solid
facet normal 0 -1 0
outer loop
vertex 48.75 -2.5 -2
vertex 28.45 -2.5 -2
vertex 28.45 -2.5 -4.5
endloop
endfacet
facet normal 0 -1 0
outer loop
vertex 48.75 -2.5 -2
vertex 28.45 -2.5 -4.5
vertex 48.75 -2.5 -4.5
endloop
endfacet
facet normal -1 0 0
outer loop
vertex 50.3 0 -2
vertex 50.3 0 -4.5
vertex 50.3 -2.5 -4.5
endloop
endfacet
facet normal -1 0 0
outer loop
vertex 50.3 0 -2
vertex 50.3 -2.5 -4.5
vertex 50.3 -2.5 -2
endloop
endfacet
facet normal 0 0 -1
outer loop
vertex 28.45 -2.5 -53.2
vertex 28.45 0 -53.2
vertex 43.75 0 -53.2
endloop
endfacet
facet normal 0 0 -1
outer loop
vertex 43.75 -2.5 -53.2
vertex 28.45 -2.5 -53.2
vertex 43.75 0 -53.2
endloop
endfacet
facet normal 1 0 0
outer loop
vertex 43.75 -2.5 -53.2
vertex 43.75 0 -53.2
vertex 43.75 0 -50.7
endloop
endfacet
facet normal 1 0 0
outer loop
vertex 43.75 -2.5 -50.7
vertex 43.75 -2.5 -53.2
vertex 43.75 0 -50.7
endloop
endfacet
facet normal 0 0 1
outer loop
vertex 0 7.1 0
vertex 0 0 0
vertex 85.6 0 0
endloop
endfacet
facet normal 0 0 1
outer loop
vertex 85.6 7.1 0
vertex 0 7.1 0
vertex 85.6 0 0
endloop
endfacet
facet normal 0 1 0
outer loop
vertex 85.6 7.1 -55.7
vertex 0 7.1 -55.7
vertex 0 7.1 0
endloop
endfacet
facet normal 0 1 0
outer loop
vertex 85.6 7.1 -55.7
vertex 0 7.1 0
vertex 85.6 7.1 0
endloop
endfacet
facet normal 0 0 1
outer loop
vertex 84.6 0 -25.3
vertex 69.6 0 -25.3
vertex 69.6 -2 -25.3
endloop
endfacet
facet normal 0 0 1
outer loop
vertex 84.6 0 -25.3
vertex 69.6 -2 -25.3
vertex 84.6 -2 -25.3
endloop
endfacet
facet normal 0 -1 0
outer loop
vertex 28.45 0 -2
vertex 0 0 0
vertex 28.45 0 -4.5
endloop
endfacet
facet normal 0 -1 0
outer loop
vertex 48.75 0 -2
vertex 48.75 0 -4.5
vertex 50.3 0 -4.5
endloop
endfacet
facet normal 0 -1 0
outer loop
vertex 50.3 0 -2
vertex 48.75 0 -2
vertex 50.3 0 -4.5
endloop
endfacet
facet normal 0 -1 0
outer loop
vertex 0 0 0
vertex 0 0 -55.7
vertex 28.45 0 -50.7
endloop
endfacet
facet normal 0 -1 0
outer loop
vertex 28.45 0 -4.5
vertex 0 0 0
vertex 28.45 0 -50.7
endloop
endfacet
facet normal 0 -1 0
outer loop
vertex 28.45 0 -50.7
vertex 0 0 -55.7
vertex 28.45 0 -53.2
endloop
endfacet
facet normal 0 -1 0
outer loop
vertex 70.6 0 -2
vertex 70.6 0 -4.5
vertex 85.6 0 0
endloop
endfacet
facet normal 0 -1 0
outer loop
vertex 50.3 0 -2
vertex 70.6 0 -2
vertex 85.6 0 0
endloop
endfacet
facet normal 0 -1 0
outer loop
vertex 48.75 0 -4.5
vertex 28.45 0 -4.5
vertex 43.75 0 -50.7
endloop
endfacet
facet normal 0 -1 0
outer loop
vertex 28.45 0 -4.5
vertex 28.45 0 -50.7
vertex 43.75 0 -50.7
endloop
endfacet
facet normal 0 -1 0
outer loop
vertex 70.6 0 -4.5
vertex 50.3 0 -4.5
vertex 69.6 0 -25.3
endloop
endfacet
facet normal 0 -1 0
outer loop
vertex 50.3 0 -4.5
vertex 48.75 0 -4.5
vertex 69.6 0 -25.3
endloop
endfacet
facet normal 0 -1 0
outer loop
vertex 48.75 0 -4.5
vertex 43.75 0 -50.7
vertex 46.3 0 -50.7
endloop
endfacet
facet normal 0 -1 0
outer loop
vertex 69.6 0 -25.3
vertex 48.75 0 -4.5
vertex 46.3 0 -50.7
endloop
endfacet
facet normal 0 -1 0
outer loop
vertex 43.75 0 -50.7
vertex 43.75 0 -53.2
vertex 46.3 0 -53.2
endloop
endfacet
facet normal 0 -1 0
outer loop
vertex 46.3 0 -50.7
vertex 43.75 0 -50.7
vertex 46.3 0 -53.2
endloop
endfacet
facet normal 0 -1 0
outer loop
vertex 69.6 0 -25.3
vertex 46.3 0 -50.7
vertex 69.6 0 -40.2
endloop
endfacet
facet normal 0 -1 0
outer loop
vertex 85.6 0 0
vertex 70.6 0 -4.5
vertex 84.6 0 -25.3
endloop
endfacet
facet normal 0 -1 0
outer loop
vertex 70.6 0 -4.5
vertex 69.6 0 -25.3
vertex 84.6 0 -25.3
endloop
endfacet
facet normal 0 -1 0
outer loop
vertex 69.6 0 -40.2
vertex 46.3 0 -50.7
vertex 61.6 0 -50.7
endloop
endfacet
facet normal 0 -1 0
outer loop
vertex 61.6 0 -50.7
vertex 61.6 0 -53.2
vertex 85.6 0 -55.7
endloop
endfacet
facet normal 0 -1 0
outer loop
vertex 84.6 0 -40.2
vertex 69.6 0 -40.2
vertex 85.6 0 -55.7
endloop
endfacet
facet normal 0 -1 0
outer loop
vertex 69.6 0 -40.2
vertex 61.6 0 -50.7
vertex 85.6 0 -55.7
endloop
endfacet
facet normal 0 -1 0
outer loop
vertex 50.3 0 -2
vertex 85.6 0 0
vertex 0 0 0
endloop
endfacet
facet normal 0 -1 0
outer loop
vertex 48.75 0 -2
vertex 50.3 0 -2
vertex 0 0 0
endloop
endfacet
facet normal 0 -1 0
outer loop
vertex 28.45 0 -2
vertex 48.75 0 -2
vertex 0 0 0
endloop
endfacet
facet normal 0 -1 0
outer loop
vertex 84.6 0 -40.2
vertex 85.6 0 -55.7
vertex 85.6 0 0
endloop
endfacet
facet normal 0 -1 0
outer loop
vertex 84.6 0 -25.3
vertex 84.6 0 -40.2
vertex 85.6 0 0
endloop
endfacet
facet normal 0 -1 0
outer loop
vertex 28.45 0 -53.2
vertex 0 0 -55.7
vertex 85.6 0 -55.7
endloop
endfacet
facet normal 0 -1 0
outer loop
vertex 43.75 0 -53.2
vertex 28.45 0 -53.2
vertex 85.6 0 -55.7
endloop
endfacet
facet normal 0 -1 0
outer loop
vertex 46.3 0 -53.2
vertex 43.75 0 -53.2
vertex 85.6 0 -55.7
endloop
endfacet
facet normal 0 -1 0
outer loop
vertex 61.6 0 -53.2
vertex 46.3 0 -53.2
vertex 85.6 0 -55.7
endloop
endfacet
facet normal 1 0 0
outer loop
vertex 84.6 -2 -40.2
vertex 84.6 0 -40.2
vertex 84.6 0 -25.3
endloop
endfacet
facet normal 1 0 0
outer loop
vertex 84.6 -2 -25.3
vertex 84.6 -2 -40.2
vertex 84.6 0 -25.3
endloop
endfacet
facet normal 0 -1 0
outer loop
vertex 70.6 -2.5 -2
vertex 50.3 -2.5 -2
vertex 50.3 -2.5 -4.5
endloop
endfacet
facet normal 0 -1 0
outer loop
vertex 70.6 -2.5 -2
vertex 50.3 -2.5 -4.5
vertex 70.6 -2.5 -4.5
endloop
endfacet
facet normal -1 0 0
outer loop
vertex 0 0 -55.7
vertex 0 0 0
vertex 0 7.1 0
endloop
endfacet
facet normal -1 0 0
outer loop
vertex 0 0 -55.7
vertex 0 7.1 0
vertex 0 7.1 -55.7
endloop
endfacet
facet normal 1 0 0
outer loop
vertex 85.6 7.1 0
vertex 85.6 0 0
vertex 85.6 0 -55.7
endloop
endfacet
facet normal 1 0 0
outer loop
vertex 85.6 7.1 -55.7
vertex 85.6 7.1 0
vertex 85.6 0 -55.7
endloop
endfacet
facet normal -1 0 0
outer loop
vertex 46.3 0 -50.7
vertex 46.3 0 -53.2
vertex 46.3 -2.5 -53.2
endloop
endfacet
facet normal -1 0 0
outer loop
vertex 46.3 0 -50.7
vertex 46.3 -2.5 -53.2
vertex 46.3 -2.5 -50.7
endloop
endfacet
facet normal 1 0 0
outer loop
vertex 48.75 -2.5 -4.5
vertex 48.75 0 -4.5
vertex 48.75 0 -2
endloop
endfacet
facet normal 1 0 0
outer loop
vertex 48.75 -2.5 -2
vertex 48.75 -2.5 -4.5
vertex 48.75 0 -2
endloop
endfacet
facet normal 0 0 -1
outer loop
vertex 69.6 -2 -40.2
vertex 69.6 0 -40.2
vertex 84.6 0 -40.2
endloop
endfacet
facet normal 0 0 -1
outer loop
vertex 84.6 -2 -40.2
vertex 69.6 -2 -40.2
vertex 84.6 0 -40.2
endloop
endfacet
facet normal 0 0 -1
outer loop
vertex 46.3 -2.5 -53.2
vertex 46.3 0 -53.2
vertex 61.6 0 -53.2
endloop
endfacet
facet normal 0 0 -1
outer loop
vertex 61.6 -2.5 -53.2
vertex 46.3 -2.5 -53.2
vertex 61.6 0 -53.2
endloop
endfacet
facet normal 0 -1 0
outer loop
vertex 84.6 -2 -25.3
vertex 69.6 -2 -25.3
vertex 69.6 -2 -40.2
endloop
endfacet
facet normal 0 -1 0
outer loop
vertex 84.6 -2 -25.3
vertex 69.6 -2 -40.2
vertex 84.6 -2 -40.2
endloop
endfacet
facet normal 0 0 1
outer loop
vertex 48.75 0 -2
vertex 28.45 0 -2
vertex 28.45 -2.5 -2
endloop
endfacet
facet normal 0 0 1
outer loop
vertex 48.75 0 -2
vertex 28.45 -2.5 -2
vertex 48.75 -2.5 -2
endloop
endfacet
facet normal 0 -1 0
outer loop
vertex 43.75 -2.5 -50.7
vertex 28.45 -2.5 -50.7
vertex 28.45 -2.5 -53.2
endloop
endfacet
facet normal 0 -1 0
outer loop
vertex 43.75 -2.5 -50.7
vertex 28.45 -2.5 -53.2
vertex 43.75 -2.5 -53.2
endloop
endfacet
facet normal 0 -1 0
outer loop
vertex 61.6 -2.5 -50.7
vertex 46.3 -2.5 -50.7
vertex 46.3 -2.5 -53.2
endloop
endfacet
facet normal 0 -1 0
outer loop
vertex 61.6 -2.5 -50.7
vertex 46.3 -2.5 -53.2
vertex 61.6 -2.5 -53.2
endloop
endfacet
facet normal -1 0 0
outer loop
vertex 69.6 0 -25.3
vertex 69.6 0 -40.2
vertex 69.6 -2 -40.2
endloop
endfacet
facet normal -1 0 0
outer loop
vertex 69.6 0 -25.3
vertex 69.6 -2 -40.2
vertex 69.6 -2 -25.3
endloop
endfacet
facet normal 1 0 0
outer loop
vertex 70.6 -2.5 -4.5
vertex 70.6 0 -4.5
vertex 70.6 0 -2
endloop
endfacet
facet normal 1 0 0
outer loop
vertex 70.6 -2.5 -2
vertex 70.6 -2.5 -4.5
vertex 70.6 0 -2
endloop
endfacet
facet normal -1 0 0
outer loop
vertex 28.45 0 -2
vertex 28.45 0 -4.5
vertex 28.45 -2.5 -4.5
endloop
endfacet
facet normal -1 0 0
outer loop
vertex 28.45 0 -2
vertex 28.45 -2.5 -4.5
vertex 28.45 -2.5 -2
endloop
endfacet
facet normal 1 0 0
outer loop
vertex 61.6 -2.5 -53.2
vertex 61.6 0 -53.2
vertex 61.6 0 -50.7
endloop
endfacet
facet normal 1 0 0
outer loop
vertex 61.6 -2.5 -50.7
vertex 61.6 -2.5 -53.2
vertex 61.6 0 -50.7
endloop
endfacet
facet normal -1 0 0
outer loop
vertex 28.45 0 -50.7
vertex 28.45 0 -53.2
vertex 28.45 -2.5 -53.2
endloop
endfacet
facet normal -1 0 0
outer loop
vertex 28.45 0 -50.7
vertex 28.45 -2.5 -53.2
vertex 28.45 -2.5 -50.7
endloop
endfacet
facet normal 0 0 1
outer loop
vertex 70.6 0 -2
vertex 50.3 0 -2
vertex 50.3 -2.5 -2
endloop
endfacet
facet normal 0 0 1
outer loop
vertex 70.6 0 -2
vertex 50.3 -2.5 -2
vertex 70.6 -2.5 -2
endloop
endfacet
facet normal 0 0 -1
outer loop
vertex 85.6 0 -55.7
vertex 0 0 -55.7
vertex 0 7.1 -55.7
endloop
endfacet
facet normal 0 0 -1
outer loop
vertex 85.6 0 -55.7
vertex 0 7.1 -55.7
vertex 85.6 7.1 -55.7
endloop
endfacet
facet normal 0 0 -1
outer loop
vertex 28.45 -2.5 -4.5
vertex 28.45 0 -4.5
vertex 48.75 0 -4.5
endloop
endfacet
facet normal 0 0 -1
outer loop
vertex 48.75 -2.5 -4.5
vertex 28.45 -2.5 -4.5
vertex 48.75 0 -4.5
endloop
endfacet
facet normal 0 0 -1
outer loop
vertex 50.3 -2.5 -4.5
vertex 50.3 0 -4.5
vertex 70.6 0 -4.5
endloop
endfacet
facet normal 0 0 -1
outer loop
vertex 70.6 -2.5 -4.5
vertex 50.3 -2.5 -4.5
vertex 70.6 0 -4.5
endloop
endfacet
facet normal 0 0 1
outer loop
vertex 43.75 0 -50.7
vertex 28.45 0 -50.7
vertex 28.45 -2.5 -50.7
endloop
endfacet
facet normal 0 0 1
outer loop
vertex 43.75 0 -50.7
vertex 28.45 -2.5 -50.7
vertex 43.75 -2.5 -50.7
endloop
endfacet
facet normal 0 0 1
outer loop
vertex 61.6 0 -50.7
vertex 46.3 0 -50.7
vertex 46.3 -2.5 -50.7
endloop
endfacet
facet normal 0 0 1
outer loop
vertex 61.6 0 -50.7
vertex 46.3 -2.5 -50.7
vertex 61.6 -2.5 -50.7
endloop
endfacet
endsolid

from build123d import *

# Parameters (mm, degrees)
SKETCH1_W           = 85.6
SKETCH1_H           = 55.7
BOSS_EXTRUDE1_DEPTH = 7.1
SKETCH2_W           = 20.3
SKETCH2_H           = 2.5
SKETCH2_W_2         = 15.3
BOSS_EXTRUDE2_DEPTH = 2.5
SKETCH3_W           = 15
SKETCH3_H           = 14.9
BOSS_EXTRUDE3_DEPTH = 2


with BuildPart() as part:
    # Sketch1 → Boss-Extrude1 (new body)
    with BuildSketch(Plane(origin=(0, 0, 0), x_dir=(1, 0, 0), z_dir=(0, 1, 0))):
        with Locations((42.8, 27.85)):
            Rectangle(SKETCH1_W, SKETCH1_H)
    extrude(amount=BOSS_EXTRUDE1_DEPTH)

    # Sketch2 → Boss-Extrude2 (add)
    with BuildSketch(Plane.XZ):
        with Locations((38.6, -3.25)):
            Rectangle(SKETCH2_W, SKETCH2_H)
        with Locations((60.45, -3.25)):
            Rectangle(SKETCH2_W, SKETCH2_H)
        with Locations((53.95, -51.95)):
            Rectangle(SKETCH2_W_2, SKETCH2_H)
        with Locations((36.1, -51.95)):
            Rectangle(SKETCH2_W_2, SKETCH2_H)
    extrude(amount=BOSS_EXTRUDE2_DEPTH)

    # Sketch3 → Boss-Extrude3 (add)
    with BuildSketch(Plane.XZ):
        with Locations((77.1, -32.75)):
            Rectangle(SKETCH3_W, SKETCH3_H)
    extrude(amount=BOSS_EXTRUDE3_DEPTH)


solid = part.part
